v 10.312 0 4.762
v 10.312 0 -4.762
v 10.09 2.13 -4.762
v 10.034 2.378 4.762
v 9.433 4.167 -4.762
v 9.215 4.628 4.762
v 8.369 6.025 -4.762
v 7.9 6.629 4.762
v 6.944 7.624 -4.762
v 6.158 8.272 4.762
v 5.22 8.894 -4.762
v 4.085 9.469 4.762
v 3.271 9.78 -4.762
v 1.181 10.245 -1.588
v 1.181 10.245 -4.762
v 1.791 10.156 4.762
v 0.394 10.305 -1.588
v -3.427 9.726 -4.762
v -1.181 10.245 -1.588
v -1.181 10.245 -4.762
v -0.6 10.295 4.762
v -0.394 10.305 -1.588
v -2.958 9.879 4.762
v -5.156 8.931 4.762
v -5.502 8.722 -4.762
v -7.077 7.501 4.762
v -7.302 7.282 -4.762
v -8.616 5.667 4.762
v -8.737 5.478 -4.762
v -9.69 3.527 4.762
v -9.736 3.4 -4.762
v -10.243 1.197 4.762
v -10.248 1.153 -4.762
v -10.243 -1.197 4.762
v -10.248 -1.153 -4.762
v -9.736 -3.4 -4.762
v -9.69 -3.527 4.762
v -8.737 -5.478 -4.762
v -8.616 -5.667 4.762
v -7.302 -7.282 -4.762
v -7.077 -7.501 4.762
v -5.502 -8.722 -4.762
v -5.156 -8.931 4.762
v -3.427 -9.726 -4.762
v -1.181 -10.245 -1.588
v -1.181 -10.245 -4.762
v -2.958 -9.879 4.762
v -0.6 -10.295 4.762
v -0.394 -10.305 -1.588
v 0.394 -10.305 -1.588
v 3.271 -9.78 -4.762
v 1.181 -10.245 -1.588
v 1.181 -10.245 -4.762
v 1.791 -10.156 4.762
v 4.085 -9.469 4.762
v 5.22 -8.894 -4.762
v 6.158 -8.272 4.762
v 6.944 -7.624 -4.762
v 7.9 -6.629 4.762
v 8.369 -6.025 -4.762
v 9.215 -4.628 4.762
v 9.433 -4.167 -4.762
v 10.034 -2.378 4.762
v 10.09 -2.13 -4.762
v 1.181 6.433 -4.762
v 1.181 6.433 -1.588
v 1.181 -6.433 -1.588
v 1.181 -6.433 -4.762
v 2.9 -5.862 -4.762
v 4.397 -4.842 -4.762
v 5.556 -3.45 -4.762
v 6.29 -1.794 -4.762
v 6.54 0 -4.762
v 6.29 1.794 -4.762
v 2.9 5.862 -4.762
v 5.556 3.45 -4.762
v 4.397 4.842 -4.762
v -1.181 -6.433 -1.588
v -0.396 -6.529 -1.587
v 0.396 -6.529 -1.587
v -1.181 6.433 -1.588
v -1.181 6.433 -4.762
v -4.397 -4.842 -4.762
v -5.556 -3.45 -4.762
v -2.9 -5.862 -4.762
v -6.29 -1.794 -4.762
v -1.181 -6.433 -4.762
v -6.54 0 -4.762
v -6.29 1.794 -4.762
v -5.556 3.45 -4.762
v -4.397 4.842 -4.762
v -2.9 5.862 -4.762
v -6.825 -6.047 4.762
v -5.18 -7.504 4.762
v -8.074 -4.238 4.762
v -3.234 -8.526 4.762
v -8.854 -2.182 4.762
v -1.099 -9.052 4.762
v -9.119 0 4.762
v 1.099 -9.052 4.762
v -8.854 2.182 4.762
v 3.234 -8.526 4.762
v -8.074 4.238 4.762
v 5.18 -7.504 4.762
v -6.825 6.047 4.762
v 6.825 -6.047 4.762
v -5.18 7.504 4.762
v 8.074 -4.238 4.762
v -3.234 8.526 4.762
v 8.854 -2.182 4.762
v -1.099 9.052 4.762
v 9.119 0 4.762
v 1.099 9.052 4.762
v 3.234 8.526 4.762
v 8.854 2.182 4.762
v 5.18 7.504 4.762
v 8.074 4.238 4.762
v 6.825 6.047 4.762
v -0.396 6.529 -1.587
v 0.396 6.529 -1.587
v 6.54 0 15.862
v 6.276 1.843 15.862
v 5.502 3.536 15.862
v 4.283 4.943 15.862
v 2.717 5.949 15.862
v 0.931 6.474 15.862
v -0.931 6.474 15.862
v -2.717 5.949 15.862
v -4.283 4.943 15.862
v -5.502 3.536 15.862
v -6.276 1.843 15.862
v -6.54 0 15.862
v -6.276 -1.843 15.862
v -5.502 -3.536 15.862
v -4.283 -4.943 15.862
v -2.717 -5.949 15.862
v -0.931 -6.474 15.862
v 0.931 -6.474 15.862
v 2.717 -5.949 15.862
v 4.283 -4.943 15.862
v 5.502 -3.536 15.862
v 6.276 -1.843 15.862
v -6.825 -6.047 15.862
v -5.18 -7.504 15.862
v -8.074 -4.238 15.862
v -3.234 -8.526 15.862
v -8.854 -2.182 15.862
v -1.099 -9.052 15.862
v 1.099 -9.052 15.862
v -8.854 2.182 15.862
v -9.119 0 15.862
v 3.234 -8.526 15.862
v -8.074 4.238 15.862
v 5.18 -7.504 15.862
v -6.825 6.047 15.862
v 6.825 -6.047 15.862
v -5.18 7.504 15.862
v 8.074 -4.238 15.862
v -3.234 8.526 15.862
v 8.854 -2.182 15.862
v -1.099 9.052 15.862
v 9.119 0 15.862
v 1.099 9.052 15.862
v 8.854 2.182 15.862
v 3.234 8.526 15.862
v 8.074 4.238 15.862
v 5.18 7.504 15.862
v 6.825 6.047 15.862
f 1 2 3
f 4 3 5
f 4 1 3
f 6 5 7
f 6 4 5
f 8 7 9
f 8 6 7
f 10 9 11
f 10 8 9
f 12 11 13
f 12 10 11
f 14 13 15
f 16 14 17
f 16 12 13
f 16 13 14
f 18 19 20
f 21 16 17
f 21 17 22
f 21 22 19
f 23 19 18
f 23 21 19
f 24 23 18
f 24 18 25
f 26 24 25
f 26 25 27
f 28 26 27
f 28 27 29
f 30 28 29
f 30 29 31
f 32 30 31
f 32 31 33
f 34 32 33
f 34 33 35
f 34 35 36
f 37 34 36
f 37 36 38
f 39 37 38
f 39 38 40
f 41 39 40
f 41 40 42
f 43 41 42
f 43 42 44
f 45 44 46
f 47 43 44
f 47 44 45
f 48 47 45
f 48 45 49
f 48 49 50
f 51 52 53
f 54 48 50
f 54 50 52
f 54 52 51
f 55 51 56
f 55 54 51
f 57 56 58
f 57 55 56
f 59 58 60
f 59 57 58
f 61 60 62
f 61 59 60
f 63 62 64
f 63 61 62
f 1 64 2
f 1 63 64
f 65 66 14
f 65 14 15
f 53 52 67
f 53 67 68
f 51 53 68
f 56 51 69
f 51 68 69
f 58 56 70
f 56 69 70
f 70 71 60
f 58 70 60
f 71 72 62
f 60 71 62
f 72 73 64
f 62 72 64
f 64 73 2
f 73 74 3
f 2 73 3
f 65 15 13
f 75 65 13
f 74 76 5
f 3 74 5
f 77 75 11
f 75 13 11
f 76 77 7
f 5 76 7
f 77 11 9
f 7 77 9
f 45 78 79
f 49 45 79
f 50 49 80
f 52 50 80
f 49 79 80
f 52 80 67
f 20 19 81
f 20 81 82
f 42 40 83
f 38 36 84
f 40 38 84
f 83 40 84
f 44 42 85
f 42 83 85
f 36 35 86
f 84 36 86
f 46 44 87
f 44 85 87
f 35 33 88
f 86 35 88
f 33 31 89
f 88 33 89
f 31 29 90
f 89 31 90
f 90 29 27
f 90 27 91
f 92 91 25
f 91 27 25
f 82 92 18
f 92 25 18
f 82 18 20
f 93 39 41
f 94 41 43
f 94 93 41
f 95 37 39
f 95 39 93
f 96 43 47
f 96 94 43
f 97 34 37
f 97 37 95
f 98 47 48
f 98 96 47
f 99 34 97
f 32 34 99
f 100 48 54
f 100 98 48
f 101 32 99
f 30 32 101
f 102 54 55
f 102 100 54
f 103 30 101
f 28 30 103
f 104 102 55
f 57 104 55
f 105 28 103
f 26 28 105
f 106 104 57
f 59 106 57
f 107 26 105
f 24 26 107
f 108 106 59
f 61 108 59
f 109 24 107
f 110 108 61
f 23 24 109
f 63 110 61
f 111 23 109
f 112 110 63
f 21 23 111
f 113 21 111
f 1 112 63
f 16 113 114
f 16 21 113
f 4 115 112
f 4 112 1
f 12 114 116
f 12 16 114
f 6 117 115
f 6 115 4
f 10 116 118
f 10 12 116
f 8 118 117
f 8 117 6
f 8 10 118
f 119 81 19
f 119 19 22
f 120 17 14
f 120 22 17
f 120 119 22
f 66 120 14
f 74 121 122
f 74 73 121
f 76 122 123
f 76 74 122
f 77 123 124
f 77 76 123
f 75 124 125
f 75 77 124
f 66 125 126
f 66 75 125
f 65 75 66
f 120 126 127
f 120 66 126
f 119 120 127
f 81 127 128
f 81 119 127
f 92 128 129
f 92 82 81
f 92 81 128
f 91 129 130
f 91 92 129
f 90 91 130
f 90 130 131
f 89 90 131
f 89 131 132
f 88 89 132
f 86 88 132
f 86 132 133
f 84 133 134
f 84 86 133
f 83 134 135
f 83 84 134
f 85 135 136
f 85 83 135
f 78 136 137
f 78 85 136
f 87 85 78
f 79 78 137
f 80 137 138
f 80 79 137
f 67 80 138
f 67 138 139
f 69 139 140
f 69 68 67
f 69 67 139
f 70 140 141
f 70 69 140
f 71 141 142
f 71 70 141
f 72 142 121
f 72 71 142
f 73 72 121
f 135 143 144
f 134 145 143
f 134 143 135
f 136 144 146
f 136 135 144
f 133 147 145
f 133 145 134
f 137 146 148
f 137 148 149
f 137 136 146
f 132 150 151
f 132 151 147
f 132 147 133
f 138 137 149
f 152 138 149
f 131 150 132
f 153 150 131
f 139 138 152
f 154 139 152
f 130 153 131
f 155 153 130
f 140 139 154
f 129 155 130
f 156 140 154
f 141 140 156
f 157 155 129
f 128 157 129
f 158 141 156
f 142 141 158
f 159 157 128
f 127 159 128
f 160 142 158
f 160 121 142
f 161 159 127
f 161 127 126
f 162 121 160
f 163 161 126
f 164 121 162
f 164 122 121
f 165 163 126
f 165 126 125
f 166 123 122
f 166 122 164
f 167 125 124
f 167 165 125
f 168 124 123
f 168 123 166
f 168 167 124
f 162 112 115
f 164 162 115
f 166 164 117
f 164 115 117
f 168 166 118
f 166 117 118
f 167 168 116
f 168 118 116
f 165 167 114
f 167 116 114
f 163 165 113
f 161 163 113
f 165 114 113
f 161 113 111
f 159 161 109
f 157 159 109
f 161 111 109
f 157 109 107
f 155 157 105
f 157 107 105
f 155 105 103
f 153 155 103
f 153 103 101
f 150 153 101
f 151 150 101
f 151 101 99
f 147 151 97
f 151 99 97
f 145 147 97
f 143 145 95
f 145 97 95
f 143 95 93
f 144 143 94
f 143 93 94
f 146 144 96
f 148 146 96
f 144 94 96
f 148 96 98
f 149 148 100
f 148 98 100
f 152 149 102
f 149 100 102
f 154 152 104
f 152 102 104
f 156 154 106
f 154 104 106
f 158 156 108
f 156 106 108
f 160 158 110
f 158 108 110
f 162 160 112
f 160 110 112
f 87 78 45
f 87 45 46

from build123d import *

# Parameters (mm, degrees)
SKETCH1_R               = 10.3124
SKETCH1_R_2             = 6.5405
BOSS_EXTRUDE1_DEPTH     = 4.7625
SKETCH2_R               = 9.1186
SKETCH2_R_2             = 6.5405
BOSS_EXTRUDE2_DEPTH     = 11.0998
SKETCH3_W               = 2.3622
SKETCH3_H               = 3.175
CUT_EXTRUDE1_DEPTH      = 11.3124
CUT_EXTRUDE1_DEPTH_BACK = 11.3124


with BuildPart() as part:
    # Sketch1 → Boss-Extrude1 (new body, symmetric)
    with BuildSketch(Plane.XY):
        Circle(SKETCH1_R)
        Circle(SKETCH1_R_2, mode=Mode.SUBTRACT)
    extrude(amount=BOSS_EXTRUDE1_DEPTH, both=True)

    # Sketch2 → Boss-Extrude2 (add)
    with BuildSketch(Plane.XY.offset(4.7625)):
        Circle(SKETCH2_R)
        Circle(SKETCH2_R_2, mode=Mode.SUBTRACT)
    extrude(amount=BOSS_EXTRUDE2_DEPTH)

    # Sketch3 → Cut-Extrude1 (cut, two sides)
    with BuildSketch(Plane(origin=(0, 0, 0), x_dir=(1, 0, 0), z_dir=(0, 1, 0))) as cut_extrude1_sk:
        with Locations((0, 3.175)):
            Rectangle(SKETCH3_W, SKETCH3_H)
    extrude(amount=CUT_EXTRUDE1_DEPTH, mode=Mode.SUBTRACT)
    extrude(cut_extrude1_sk.sketch, amount=-CUT_EXTRUDE1_DEPTH_BACK, mode=Mode.SUBTRACT)


solid = part.part
